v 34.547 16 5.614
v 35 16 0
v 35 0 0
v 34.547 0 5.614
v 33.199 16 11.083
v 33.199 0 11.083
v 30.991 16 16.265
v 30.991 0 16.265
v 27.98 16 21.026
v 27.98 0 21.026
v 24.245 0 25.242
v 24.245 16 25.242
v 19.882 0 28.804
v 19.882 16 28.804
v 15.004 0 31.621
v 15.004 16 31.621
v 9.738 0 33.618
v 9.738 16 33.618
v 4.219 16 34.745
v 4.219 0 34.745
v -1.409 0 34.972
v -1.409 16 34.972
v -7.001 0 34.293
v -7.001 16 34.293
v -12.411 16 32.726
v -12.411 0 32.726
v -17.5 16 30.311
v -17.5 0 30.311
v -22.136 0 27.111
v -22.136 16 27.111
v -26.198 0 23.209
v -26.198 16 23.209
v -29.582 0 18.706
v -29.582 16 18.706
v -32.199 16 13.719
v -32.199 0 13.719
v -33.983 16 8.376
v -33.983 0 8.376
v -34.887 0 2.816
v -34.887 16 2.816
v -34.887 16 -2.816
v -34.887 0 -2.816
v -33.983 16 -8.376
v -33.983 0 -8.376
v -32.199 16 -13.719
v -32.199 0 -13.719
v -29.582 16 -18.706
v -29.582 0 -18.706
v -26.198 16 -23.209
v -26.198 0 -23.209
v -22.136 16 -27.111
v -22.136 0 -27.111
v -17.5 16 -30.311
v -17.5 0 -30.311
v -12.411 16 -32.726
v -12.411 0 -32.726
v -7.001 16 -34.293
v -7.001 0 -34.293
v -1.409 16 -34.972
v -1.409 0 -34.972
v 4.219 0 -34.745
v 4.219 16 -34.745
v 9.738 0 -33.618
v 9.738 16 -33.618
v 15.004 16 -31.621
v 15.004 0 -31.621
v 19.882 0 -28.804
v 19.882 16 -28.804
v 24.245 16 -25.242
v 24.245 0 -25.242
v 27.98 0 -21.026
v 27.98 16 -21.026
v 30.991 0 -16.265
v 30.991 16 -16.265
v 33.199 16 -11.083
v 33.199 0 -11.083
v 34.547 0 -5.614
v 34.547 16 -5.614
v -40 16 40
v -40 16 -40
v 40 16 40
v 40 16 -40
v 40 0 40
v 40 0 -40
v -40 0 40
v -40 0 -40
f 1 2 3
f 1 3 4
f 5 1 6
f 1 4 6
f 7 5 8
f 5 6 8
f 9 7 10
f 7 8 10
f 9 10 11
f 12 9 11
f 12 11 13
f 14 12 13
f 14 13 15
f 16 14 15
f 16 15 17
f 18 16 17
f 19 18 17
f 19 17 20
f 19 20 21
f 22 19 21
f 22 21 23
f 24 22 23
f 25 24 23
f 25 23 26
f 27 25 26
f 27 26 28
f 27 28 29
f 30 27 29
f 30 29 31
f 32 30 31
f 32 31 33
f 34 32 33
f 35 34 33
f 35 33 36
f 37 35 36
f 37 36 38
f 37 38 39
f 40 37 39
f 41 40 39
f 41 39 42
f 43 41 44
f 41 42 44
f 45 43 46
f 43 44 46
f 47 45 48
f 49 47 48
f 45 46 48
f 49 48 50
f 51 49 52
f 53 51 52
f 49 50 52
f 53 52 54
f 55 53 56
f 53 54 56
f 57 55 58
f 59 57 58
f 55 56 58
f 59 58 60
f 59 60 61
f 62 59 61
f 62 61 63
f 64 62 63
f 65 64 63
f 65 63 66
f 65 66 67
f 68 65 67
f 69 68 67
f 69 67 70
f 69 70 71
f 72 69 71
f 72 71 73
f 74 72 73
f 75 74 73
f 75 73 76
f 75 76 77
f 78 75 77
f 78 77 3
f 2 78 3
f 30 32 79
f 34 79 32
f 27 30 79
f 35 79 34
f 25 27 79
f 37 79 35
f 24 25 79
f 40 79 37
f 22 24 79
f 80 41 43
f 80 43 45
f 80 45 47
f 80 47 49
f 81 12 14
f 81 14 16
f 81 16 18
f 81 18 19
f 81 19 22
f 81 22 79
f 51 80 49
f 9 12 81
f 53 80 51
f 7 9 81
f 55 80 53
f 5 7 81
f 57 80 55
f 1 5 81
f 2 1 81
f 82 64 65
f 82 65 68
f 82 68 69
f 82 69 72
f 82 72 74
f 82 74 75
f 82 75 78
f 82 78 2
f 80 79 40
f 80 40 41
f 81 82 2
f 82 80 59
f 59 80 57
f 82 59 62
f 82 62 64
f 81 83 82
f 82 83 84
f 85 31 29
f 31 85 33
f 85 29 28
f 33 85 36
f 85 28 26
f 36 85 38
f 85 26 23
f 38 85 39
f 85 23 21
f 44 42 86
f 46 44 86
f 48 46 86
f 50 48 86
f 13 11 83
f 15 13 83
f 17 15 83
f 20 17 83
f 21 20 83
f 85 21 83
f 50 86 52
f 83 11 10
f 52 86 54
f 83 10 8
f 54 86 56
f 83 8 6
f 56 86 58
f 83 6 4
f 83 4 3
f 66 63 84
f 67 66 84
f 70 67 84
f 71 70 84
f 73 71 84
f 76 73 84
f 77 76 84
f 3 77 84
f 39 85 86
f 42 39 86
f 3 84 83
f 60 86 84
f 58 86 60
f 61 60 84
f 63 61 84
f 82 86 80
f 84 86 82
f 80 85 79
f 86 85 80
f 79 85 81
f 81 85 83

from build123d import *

# Parameters (mm, degrees)
SKETCH1_W           = 80
SKETCH1_H           = 80
BOSS_EXTRUDE1_DEPTH = 16
SKETCH2_R           = 35
CUT_EXTRUDE1_DEPTH  = 17


with BuildPart() as part:
    # Sketch1 → Boss-Extrude1 (new body)
    with BuildSketch(Plane(origin=(0, 0, 0), x_dir=(1, 0, 0), z_dir=(0, 1, 0))):
        Rectangle(SKETCH1_W, SKETCH1_H)
    extrude(amount=BOSS_EXTRUDE1_DEPTH)

    # Sketch2 → Cut-Extrude1 (cut, through all)
    with BuildSketch(Plane.XZ):
        Circle(SKETCH2_R)
    extrude(amount=-CUT_EXTRUDE1_DEPTH, mode=Mode.SUBTRACT)


solid = part.part
